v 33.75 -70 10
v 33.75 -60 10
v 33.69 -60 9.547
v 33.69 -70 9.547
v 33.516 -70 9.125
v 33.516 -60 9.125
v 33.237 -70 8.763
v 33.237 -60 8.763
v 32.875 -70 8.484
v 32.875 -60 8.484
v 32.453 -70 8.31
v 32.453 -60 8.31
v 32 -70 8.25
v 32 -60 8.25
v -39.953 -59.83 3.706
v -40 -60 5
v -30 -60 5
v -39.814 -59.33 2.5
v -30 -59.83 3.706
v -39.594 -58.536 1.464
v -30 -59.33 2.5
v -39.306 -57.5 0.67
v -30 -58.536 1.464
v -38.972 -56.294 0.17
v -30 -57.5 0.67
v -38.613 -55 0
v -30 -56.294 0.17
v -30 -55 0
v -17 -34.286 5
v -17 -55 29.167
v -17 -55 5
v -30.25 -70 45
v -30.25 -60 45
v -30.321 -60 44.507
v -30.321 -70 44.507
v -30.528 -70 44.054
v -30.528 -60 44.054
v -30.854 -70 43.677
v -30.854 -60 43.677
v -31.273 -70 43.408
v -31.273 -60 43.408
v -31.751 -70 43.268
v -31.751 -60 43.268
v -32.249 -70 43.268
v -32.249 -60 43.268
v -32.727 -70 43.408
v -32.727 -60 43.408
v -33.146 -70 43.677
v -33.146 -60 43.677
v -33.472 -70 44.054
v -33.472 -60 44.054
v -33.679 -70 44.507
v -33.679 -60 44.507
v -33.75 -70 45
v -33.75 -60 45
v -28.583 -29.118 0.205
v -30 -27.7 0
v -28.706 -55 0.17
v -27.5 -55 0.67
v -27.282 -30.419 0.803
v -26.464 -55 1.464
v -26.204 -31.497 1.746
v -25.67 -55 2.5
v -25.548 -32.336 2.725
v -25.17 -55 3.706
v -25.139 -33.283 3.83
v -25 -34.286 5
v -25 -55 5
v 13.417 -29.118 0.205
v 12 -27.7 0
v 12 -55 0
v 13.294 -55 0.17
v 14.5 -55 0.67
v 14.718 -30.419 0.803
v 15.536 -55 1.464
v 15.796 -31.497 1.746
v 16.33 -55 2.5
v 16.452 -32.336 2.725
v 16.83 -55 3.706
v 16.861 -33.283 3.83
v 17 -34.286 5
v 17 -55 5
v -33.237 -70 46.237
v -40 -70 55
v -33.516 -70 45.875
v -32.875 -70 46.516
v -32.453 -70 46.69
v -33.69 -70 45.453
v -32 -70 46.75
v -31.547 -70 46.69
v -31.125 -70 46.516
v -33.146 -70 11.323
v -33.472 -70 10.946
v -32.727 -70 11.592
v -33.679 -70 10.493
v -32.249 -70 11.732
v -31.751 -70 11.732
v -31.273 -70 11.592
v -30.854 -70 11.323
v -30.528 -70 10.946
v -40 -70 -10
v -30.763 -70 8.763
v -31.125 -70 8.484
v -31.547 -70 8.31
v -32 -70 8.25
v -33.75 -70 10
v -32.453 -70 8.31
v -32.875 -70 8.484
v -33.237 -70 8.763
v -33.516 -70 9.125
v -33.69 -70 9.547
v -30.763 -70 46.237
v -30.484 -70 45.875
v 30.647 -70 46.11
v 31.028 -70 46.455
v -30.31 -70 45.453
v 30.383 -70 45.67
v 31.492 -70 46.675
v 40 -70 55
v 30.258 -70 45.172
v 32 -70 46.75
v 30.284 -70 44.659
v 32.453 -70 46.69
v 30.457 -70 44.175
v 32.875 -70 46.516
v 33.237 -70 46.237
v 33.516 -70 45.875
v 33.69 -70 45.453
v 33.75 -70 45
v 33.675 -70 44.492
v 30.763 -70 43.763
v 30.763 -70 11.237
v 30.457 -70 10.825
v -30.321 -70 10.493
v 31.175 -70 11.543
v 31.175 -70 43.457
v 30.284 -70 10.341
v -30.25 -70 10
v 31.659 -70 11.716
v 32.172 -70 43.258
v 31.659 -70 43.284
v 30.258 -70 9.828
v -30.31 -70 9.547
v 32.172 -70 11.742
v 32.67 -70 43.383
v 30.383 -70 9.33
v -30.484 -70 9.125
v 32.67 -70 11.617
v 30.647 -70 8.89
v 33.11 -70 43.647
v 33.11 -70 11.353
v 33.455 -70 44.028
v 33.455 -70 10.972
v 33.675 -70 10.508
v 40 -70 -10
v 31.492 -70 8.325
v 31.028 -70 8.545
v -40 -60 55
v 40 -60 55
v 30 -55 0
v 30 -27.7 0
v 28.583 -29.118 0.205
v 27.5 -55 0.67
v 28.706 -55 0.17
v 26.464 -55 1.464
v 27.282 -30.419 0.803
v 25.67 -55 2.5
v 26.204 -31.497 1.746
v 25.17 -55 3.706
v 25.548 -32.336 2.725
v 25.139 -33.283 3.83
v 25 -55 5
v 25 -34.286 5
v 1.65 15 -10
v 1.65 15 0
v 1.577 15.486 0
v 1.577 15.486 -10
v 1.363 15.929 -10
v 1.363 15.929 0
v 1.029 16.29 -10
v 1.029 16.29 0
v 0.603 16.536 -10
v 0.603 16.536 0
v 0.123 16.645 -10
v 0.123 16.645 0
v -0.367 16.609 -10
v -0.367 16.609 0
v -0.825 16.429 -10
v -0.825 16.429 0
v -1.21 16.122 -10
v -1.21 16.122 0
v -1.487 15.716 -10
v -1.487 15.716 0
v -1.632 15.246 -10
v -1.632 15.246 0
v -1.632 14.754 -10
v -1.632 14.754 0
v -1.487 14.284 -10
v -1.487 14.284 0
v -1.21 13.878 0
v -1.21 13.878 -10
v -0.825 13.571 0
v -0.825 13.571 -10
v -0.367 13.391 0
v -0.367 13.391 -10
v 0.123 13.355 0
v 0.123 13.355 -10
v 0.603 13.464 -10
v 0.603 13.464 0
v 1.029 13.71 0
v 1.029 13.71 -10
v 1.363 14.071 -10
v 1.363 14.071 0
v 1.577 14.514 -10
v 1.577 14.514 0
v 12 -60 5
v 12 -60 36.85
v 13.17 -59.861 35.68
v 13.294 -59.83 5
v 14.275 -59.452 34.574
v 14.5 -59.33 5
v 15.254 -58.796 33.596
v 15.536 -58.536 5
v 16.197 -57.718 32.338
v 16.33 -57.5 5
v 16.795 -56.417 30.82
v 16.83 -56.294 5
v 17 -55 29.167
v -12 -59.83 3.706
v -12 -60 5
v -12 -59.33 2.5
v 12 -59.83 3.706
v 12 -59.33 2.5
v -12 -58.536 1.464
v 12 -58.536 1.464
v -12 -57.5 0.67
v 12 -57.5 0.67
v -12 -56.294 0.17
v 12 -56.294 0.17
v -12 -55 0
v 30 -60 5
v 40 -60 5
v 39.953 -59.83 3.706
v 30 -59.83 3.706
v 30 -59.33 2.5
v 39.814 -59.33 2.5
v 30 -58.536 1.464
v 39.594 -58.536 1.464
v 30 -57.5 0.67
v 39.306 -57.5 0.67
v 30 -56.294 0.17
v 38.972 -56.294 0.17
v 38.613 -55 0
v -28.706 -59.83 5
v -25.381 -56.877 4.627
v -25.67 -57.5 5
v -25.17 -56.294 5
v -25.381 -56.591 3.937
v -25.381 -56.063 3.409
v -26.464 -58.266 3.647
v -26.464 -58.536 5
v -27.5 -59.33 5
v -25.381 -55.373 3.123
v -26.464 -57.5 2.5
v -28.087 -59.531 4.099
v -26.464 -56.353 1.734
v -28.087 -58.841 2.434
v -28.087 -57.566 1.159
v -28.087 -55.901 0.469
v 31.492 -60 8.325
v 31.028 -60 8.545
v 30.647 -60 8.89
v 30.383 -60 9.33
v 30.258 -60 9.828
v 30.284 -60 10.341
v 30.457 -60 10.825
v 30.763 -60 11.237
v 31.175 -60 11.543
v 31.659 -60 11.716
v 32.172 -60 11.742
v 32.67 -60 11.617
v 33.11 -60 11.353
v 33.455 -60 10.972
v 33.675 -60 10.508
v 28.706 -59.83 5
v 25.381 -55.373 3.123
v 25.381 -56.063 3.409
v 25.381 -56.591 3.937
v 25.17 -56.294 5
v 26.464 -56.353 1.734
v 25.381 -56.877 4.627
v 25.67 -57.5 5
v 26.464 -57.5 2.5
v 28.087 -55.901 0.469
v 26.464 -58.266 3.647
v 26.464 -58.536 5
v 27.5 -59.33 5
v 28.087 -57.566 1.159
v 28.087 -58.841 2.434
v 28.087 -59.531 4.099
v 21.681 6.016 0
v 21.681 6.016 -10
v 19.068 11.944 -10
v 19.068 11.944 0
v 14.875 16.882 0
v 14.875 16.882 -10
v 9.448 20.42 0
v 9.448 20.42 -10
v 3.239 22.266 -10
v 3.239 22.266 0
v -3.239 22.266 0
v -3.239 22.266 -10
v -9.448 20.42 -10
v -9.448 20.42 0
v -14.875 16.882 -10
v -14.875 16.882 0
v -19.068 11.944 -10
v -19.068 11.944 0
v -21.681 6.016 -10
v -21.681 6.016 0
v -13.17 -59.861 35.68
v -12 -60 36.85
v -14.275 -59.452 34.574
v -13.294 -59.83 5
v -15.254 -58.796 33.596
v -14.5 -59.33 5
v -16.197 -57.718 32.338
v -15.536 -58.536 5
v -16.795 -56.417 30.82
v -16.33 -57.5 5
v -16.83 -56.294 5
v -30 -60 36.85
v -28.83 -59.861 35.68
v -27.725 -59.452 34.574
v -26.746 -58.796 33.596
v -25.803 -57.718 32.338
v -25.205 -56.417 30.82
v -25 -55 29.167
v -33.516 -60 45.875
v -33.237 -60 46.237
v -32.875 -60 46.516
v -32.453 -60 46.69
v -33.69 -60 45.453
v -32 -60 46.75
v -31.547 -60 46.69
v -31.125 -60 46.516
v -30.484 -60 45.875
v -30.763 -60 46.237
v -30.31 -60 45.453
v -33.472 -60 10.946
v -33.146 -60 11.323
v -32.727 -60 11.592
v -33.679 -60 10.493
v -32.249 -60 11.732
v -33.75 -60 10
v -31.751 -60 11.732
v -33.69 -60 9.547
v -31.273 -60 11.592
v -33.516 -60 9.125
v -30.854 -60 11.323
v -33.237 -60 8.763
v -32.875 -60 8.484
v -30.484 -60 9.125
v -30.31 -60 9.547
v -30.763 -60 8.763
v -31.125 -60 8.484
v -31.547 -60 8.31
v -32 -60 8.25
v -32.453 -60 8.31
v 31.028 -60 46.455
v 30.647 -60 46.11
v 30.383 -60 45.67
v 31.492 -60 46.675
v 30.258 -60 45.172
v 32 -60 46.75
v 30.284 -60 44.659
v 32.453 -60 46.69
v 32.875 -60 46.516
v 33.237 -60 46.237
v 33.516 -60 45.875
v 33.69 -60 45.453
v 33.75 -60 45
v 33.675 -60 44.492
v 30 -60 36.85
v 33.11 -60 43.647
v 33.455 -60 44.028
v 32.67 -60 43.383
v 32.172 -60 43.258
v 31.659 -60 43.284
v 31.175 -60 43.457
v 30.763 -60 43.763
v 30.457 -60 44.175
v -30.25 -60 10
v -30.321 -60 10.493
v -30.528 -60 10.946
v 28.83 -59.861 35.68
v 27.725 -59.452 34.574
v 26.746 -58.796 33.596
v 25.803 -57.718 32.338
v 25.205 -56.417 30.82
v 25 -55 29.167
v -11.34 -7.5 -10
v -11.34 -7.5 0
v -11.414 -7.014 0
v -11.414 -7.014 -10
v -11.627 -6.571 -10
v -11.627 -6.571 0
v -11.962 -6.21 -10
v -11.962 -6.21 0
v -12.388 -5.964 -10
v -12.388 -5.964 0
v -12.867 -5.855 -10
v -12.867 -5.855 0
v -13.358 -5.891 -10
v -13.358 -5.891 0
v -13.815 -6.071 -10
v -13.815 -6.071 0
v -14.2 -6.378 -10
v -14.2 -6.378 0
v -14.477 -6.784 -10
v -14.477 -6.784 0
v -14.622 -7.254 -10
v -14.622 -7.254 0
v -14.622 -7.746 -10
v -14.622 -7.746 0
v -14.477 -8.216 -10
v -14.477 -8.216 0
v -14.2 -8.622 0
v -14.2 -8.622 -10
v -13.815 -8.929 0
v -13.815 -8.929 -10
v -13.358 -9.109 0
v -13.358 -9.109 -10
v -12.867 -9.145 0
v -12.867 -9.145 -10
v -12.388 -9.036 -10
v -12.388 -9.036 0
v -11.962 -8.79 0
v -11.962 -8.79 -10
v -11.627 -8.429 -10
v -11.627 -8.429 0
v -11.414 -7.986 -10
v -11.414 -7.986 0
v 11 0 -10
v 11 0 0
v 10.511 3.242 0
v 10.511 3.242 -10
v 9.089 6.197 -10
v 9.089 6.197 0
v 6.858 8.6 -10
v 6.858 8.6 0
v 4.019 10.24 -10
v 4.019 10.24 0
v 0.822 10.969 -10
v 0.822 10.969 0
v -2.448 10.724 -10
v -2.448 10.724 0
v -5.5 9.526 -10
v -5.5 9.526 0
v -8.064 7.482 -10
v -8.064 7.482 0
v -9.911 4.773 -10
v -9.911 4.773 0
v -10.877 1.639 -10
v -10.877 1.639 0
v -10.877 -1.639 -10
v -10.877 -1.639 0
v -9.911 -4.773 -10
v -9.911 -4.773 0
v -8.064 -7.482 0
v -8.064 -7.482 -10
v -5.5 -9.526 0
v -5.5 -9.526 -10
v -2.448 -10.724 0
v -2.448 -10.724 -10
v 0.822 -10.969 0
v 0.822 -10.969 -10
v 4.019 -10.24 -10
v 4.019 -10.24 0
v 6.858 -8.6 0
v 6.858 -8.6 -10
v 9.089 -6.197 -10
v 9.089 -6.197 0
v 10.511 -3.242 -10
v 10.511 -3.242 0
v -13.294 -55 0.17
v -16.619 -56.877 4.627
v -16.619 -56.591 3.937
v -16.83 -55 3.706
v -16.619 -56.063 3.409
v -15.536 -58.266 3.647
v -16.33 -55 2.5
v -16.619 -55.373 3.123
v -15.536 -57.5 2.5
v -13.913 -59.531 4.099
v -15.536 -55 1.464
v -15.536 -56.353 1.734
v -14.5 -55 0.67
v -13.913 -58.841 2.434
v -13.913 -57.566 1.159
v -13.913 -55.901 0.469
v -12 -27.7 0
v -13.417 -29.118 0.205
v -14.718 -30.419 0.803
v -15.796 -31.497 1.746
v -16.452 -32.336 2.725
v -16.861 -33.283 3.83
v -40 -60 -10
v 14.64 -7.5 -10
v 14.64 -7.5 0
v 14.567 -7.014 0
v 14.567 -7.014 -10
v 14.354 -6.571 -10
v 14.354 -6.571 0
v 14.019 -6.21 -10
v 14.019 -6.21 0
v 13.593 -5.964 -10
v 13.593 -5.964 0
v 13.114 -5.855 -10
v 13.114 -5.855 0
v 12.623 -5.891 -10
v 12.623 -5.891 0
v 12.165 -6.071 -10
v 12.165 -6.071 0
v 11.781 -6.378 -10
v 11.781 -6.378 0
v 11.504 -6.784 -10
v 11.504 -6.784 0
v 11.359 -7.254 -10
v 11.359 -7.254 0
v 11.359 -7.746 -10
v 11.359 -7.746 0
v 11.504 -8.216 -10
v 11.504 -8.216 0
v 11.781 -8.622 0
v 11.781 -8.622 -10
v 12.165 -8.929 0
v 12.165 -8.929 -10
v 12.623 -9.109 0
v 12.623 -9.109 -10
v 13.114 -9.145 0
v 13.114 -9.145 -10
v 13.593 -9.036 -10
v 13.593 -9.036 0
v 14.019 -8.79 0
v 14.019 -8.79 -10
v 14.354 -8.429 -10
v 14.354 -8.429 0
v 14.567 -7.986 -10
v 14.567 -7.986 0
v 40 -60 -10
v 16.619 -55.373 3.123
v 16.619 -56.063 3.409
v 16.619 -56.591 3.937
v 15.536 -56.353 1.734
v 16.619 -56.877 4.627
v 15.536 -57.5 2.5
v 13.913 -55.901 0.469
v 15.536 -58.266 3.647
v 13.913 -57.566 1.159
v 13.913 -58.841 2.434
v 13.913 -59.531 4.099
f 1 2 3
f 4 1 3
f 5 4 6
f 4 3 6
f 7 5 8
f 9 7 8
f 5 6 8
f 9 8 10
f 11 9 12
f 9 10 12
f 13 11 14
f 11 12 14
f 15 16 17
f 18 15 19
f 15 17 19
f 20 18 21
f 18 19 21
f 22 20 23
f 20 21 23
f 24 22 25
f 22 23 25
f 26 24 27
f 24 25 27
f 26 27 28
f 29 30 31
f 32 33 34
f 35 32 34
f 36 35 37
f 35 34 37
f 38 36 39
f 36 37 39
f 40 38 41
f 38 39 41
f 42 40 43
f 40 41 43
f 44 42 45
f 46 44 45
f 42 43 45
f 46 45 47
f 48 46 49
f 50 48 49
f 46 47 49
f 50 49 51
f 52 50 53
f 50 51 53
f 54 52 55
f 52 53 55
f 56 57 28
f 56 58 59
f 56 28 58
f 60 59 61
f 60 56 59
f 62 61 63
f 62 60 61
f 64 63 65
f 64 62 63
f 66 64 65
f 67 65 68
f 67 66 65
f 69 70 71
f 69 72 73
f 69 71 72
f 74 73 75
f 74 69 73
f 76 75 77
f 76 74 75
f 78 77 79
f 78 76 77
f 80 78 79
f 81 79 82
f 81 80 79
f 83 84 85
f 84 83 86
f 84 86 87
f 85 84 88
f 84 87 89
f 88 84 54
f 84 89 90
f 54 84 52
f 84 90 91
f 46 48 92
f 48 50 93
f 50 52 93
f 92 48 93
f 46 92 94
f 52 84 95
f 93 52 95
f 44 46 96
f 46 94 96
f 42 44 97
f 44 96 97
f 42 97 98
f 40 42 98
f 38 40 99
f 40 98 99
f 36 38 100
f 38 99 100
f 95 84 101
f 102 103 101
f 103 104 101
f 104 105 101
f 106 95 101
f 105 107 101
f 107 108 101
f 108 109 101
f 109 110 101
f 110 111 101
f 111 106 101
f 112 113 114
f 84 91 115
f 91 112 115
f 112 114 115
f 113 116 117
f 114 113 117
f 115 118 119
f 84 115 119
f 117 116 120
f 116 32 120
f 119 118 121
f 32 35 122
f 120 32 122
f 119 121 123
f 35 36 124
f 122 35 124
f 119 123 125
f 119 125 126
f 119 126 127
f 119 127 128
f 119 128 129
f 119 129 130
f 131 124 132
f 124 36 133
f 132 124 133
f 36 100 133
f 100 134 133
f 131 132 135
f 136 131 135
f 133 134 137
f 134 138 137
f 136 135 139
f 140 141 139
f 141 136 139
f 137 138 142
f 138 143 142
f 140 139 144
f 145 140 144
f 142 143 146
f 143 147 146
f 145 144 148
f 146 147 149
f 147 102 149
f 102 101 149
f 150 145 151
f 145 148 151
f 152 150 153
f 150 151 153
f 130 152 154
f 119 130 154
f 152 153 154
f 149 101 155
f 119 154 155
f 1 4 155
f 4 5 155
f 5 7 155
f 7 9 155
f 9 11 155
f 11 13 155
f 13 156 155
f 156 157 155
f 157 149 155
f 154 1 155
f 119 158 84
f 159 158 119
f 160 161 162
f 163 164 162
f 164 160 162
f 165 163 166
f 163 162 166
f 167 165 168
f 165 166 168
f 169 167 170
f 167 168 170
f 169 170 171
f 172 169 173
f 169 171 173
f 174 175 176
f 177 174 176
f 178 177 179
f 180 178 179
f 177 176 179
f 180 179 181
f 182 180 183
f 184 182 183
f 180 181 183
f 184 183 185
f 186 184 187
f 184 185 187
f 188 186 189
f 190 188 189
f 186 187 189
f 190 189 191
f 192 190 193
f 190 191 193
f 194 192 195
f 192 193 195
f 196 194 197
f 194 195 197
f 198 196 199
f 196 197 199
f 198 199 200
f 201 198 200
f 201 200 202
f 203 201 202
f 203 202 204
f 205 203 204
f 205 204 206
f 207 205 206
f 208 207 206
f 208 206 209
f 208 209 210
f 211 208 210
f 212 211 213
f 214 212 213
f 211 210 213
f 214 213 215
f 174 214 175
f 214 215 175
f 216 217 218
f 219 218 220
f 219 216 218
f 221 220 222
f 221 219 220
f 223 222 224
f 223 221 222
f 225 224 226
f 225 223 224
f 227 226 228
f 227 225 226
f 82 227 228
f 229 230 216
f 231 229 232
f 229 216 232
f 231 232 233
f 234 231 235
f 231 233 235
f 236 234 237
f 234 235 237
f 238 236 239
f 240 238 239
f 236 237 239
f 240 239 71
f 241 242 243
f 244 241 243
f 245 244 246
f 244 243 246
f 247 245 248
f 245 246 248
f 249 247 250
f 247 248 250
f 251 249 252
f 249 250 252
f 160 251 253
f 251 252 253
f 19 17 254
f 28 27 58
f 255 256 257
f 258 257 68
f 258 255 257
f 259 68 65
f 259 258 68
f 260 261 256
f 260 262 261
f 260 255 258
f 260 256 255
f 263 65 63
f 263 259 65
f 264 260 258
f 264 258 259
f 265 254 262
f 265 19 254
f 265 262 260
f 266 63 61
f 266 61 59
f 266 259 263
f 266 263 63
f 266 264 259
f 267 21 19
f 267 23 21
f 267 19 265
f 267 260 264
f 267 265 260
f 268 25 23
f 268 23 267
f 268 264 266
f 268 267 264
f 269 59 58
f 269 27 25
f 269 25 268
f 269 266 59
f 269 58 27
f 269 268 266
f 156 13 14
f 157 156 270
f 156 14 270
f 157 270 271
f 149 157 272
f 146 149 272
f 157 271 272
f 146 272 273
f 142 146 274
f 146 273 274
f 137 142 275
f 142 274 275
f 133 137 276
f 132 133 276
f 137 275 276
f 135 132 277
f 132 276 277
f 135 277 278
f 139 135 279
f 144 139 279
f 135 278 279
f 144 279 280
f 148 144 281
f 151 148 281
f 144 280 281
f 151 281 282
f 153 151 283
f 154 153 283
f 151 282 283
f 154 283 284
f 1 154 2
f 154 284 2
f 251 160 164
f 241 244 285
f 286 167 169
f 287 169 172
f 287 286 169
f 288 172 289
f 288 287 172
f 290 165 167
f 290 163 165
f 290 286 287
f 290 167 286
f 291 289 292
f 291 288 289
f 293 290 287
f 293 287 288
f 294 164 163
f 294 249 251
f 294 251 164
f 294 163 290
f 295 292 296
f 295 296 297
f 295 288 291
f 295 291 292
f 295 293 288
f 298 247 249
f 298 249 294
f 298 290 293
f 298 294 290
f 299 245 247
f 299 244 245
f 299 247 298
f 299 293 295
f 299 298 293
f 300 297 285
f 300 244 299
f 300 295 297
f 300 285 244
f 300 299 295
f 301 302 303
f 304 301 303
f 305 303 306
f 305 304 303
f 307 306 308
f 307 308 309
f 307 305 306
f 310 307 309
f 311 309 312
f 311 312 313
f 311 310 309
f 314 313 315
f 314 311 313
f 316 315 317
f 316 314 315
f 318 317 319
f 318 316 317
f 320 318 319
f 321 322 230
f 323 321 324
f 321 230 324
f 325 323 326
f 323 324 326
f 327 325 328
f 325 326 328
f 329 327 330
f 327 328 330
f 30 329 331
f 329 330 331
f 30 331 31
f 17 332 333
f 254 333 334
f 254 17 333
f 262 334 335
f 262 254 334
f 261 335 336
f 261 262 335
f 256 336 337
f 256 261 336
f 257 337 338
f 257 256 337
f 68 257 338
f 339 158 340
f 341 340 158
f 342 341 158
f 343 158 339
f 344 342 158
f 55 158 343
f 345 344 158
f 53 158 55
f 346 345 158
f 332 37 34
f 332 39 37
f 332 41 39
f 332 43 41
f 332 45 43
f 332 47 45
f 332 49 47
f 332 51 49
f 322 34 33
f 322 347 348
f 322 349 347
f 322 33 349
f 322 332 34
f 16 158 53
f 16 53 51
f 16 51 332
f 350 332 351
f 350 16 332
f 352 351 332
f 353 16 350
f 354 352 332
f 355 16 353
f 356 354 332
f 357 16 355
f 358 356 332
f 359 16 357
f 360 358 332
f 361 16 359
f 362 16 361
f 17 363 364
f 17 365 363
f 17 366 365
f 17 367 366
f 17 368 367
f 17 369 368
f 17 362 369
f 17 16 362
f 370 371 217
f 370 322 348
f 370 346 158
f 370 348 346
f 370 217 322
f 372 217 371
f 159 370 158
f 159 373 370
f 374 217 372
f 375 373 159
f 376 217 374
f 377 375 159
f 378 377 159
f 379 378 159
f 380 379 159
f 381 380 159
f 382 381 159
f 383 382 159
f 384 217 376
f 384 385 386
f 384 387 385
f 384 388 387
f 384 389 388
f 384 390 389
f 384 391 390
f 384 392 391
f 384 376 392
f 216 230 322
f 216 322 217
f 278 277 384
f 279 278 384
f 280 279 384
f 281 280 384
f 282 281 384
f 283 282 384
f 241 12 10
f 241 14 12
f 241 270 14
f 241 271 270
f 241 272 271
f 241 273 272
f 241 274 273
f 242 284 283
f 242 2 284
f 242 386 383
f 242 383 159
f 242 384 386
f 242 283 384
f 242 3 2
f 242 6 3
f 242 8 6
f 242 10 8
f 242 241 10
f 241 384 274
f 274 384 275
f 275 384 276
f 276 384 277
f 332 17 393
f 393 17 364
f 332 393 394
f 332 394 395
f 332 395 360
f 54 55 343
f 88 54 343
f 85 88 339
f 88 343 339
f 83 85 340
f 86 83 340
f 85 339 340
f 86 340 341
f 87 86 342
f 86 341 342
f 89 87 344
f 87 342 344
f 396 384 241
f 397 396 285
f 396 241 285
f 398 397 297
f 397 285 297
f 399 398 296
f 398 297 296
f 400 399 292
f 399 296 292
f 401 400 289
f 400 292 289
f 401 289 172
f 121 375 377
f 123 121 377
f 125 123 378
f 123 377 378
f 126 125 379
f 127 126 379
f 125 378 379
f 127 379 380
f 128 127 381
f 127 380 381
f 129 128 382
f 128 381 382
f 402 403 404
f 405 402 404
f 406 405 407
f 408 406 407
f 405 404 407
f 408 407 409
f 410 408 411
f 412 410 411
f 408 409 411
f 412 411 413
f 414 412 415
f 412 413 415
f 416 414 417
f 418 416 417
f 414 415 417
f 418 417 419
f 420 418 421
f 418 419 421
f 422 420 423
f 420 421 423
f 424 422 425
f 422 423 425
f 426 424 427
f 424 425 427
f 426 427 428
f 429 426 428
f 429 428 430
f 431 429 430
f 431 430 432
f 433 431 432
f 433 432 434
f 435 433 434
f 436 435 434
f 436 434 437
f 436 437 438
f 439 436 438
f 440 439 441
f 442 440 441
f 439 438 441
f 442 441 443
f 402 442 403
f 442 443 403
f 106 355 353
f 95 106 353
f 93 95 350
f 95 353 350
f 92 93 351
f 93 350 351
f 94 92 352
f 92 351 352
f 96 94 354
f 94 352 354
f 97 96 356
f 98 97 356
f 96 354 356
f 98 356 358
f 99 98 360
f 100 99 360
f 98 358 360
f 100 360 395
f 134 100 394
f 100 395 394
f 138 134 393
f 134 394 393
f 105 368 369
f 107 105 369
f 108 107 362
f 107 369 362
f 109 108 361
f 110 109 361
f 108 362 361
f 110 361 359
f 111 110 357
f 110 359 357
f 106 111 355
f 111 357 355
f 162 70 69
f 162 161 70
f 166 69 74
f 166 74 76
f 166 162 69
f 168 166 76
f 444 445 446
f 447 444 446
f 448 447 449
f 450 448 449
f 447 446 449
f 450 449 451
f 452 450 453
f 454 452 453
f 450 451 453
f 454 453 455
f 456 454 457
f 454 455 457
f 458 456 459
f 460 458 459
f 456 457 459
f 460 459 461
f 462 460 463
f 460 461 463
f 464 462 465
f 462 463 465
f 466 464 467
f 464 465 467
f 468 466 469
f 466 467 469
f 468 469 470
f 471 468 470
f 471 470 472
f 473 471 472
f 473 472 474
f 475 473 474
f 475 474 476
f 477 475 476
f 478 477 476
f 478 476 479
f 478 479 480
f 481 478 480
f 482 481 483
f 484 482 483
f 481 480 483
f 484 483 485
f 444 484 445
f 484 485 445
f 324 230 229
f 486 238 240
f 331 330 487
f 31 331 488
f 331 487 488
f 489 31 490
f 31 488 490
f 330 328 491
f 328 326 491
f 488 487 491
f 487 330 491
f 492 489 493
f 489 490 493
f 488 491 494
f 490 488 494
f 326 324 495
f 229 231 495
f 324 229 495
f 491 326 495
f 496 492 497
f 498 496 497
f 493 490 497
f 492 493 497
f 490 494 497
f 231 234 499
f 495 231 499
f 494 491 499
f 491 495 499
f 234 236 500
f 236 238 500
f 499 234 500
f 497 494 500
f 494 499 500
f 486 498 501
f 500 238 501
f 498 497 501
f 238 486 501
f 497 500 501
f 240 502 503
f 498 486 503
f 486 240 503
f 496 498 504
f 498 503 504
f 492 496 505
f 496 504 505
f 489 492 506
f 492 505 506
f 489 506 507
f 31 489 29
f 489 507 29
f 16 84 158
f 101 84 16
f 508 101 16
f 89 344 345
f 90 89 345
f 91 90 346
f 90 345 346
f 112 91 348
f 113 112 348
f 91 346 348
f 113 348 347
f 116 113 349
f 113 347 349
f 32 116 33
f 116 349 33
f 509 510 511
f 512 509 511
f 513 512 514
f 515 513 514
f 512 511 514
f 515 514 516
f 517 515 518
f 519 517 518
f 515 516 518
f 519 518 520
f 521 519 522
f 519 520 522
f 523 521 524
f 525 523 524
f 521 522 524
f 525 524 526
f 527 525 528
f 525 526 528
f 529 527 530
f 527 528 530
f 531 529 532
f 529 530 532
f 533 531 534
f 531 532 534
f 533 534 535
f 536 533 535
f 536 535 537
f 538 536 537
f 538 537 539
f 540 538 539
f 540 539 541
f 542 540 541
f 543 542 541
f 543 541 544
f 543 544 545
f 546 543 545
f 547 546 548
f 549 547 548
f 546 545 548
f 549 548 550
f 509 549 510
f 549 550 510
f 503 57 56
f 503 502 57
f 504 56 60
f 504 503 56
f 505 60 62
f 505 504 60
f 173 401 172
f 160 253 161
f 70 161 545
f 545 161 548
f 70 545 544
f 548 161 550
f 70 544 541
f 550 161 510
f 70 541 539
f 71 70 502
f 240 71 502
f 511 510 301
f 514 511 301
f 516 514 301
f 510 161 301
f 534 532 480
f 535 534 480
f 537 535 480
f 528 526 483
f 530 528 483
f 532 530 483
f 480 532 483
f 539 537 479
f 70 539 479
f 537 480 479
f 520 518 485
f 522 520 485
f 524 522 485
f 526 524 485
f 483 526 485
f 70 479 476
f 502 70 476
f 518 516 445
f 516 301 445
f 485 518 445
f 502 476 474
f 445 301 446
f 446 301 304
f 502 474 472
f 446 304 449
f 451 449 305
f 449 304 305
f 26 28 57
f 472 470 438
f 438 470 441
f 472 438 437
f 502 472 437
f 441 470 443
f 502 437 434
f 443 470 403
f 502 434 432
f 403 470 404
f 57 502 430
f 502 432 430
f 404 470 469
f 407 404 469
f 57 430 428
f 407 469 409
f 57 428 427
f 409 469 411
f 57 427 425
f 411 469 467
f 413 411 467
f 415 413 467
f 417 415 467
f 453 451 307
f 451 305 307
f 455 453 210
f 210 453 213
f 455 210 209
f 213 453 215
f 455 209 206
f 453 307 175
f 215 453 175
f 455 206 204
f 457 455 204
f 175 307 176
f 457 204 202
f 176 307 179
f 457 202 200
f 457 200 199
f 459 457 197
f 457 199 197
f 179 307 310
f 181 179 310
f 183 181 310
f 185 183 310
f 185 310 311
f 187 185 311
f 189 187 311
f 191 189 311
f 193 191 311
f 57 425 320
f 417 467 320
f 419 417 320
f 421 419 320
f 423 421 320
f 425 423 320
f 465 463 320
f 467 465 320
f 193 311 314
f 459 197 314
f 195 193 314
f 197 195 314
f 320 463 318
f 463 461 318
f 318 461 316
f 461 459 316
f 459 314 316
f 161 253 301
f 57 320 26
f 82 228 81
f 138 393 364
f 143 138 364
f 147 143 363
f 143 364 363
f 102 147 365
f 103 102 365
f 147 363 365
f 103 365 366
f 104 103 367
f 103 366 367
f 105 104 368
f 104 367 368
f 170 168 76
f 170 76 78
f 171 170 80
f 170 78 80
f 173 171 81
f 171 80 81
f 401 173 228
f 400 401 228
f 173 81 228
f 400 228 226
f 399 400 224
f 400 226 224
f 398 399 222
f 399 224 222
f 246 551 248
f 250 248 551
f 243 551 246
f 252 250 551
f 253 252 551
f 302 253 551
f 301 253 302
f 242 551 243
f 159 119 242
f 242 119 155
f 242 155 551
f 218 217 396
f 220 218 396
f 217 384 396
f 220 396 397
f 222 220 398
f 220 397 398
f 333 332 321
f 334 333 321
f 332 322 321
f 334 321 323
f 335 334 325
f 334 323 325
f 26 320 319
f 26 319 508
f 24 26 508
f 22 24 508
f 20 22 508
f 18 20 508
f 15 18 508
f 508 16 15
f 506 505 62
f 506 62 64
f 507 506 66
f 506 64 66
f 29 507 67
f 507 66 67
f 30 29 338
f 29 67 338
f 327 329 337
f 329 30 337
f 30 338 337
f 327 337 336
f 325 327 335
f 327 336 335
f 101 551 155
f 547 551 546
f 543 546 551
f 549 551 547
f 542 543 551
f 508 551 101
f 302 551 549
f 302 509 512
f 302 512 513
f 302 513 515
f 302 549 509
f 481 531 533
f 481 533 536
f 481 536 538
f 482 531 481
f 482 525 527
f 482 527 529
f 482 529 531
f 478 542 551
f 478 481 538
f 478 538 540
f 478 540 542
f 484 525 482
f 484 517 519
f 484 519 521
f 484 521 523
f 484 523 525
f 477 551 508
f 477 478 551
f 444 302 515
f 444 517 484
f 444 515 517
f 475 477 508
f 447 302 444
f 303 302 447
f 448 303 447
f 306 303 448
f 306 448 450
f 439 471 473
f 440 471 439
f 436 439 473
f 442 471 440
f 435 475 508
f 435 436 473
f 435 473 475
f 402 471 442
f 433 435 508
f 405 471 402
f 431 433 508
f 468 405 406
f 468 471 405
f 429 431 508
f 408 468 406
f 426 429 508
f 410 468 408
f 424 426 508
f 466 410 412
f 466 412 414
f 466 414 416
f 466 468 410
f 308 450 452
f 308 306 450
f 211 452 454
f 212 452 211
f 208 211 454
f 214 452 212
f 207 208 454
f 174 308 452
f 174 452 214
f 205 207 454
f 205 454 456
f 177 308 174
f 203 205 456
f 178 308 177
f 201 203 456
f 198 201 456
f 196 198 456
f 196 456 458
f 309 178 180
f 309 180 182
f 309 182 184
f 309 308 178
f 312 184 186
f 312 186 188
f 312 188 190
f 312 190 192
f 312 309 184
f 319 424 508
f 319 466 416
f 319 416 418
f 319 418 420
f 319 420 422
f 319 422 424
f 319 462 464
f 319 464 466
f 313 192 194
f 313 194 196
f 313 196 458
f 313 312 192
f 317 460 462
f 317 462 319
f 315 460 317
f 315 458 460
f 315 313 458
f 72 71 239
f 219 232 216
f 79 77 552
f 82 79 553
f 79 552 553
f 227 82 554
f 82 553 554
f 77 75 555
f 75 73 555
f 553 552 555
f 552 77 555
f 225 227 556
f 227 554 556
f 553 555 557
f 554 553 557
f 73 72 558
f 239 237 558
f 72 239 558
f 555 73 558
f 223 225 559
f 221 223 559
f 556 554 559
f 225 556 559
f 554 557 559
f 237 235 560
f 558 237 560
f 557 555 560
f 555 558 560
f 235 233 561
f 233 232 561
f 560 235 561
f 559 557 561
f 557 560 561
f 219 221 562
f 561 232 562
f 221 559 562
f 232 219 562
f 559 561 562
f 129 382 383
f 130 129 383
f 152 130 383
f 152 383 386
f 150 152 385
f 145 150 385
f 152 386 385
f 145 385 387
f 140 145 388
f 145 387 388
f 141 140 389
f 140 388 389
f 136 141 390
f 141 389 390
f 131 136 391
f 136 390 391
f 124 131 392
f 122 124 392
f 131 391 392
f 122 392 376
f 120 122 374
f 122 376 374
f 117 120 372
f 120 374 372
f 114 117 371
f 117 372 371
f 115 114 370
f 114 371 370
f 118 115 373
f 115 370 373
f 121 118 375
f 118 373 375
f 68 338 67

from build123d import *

# Parameters (mm, degrees)
SKETCH1_R           = 1.65
SKETCH1_R_2         = 11
BOSS_EXTRUDE1_DEPTH = 10
SKETCH2_W           = 80
SKETCH2_H           = 10
BOSS_EXTRUDE2_DEPTH = 10
SKETCH3_W           = 80
SKETCH3_H           = 10
BOSS_EXTRUDE3_DEPTH = 55
SKETCH4_W           = 8
SKETCH4_H           = 35
BOSS_EXTRUDE4_DEPTH = 30
CUT_EXTRUDE1_DEPTH  = 157
CUT_EXTRUDE2_DEPTH  = 157
FILLET1_R           = 5


with BuildPart() as part:
    # Sketch1 → Boss-Extrude1 (new body)
    with BuildSketch(Plane.XY):
        with BuildLine():
            ThreePointArc((21.680728295, 6.016312875), (6.9e-07, 22.5), (-21.680727926, 6.016314205))
            Line((-21.680727926, 6.016314205), (-40, -60))
            Line((-40, -60), (40, -60))
            Line((40, -60), (21.680728295, 6.016312875))
        make_face()
        with Locations((0, 15)):
            Circle(SKETCH1_R, mode=Mode.SUBTRACT)
        with Locations((-12.990381057, -7.5)):
            Circle(SKETCH1_R, mode=Mode.SUBTRACT)
        with Locations((12.990381057, -7.5)):
            Circle(SKETCH1_R, mode=Mode.SUBTRACT)
        Circle(SKETCH1_R_2, mode=Mode.SUBTRACT)
    extrude(amount=-BOSS_EXTRUDE1_DEPTH)

    # Sketch2 → Boss-Extrude2 (add)
    with BuildSketch(Plane(origin=(0, -60, 0), x_dir=(-1, 0, 0), z_dir=(0, -1, 0))):
        with Locations((0, 5)):
            Rectangle(SKETCH2_W, SKETCH2_H)
    extrude(amount=BOSS_EXTRUDE2_DEPTH)

    # Sketch3 → Boss-Extrude3 (add)
    with BuildSketch(Plane.XY):
        with Locations((0, -65)):
            Rectangle(SKETCH3_W, SKETCH3_H)
    extrude(amount=BOSS_EXTRUDE3_DEPTH)

    # Sketch4 → Boss-Extrude4 (add)
    with BuildSketch(Plane(origin=(0, -60, 0), x_dir=(1, 0, 0), z_dir=(0, 1, 0))):
        with Locations((-21, -17.5)):
            Rectangle(SKETCH4_W, SKETCH4_H)
        with Locations((21, -17.5)):
            Rectangle(SKETCH4_W, SKETCH4_H)
    extrude(amount=BOSS_EXTRUDE4_DEPTH)

    # Sketch5 → Cut-Extrude1 (cut)
    with BuildSketch(Plane.ZY.offset(25)):
        Polygon((0, -30), (35, -60), (35, -30), align=None)
    extrude(amount=-CUT_EXTRUDE1_DEPTH, mode=Mode.SUBTRACT)

    # Sketch6 → Cut-Extrude2 (cut)
    with BuildSketch(Plane(origin=(0, -60, 0), x_dir=(1, 0, 0), z_dir=(0, 1, 0))):
        with BuildLine():
            ThreePointArc((-33.75, -45), (-33.237436867, -46.237436867), (-32, -46.75))
            Line((-32, -46.75), (-32, -45))
            Line((-32, -45), (-33.75, -45))
        make_face()
        with BuildLine():
            Line((-32, -45), (-32, -46.75))
            ThreePointArc((-32, -46.75), (-30.762563133, -46.237436867), (-30.25, -45))
            ThreePointArc((-30.25, -45), (-32, -43.25), (-33.75, -45))
            Line((-33.75, -45), (-32, -45))
        make_face()
        with BuildLine():
            ThreePointArc((33.75, -45), (30.762563133, -43.762563133), (32, -46.75))
            Line((32, -46.75), (32, -45))
            Line((32, -45), (33.75, -45))
        make_face()
        with BuildLine():
            Line((32, -45), (32, -46.75))
            ThreePointArc((32, -46.75), (33.237436867, -46.237436867), (33.75, -45))
            Line((33.75, -45), (32, -45))
        make_face()
        with BuildLine():
            ThreePointArc((33.75, -10), (33.237436867, -8.762563133), (32, -8.25))
            Line((32, -8.25), (32, -10))
            Line((32, -10), (33.75, -10))
        make_face()
        with BuildLine():
            Line((32, -10), (32, -8.25))
            ThreePointArc((32, -8.25), (30.762563133, -11.237436867), (33.75, -10))
            Line((33.75, -10), (32, -10))
        make_face()
        with BuildLine():
            ThreePointArc((-30.25, -10), (-30.762563133, -8.762563133), (-32, -8.25))
            Line((-32, -8.25), (-32, -10))
            Line((-32, -10), (-33.75, -10))
            ThreePointArc((-33.75, -10), (-32, -11.75), (-30.25, -10))
        make_face()
        with BuildLine():
            Line((-32, -10), (-32, -8.25))
            ThreePointArc((-32, -8.25), (-33.237436867, -8.762563133), (-33.75, -10))
            Line((-33.75, -10), (-32, -10))
        make_face()
    extrude(amount=-CUT_EXTRUDE2_DEPTH, mode=Mode.SUBTRACT)

    # Fillet1
    fillet1_edges = [part.edges().sort_by_distance(p)[0] for p in [
        (32.5, -60, 0),
        (0, -60, 0),
        (-32.5, -60, 0),
        (-21, -60, 35),
        (-17, -60, 17.5),
        (-17, -45, 0),
        (-25, -60, 17.5),
        (-25, -45, 0),
        (-21, -30, 0),
        (17, -45, 0),
        (25, -45, 0),
        (21, -30, 0),
        (17, -60, 17.5),
        (25, -60, 17.5),
        (21, -60, 35),
    ]]
    fillet(fillet1_edges, radius=FILLET1_R)


solid = part.part
